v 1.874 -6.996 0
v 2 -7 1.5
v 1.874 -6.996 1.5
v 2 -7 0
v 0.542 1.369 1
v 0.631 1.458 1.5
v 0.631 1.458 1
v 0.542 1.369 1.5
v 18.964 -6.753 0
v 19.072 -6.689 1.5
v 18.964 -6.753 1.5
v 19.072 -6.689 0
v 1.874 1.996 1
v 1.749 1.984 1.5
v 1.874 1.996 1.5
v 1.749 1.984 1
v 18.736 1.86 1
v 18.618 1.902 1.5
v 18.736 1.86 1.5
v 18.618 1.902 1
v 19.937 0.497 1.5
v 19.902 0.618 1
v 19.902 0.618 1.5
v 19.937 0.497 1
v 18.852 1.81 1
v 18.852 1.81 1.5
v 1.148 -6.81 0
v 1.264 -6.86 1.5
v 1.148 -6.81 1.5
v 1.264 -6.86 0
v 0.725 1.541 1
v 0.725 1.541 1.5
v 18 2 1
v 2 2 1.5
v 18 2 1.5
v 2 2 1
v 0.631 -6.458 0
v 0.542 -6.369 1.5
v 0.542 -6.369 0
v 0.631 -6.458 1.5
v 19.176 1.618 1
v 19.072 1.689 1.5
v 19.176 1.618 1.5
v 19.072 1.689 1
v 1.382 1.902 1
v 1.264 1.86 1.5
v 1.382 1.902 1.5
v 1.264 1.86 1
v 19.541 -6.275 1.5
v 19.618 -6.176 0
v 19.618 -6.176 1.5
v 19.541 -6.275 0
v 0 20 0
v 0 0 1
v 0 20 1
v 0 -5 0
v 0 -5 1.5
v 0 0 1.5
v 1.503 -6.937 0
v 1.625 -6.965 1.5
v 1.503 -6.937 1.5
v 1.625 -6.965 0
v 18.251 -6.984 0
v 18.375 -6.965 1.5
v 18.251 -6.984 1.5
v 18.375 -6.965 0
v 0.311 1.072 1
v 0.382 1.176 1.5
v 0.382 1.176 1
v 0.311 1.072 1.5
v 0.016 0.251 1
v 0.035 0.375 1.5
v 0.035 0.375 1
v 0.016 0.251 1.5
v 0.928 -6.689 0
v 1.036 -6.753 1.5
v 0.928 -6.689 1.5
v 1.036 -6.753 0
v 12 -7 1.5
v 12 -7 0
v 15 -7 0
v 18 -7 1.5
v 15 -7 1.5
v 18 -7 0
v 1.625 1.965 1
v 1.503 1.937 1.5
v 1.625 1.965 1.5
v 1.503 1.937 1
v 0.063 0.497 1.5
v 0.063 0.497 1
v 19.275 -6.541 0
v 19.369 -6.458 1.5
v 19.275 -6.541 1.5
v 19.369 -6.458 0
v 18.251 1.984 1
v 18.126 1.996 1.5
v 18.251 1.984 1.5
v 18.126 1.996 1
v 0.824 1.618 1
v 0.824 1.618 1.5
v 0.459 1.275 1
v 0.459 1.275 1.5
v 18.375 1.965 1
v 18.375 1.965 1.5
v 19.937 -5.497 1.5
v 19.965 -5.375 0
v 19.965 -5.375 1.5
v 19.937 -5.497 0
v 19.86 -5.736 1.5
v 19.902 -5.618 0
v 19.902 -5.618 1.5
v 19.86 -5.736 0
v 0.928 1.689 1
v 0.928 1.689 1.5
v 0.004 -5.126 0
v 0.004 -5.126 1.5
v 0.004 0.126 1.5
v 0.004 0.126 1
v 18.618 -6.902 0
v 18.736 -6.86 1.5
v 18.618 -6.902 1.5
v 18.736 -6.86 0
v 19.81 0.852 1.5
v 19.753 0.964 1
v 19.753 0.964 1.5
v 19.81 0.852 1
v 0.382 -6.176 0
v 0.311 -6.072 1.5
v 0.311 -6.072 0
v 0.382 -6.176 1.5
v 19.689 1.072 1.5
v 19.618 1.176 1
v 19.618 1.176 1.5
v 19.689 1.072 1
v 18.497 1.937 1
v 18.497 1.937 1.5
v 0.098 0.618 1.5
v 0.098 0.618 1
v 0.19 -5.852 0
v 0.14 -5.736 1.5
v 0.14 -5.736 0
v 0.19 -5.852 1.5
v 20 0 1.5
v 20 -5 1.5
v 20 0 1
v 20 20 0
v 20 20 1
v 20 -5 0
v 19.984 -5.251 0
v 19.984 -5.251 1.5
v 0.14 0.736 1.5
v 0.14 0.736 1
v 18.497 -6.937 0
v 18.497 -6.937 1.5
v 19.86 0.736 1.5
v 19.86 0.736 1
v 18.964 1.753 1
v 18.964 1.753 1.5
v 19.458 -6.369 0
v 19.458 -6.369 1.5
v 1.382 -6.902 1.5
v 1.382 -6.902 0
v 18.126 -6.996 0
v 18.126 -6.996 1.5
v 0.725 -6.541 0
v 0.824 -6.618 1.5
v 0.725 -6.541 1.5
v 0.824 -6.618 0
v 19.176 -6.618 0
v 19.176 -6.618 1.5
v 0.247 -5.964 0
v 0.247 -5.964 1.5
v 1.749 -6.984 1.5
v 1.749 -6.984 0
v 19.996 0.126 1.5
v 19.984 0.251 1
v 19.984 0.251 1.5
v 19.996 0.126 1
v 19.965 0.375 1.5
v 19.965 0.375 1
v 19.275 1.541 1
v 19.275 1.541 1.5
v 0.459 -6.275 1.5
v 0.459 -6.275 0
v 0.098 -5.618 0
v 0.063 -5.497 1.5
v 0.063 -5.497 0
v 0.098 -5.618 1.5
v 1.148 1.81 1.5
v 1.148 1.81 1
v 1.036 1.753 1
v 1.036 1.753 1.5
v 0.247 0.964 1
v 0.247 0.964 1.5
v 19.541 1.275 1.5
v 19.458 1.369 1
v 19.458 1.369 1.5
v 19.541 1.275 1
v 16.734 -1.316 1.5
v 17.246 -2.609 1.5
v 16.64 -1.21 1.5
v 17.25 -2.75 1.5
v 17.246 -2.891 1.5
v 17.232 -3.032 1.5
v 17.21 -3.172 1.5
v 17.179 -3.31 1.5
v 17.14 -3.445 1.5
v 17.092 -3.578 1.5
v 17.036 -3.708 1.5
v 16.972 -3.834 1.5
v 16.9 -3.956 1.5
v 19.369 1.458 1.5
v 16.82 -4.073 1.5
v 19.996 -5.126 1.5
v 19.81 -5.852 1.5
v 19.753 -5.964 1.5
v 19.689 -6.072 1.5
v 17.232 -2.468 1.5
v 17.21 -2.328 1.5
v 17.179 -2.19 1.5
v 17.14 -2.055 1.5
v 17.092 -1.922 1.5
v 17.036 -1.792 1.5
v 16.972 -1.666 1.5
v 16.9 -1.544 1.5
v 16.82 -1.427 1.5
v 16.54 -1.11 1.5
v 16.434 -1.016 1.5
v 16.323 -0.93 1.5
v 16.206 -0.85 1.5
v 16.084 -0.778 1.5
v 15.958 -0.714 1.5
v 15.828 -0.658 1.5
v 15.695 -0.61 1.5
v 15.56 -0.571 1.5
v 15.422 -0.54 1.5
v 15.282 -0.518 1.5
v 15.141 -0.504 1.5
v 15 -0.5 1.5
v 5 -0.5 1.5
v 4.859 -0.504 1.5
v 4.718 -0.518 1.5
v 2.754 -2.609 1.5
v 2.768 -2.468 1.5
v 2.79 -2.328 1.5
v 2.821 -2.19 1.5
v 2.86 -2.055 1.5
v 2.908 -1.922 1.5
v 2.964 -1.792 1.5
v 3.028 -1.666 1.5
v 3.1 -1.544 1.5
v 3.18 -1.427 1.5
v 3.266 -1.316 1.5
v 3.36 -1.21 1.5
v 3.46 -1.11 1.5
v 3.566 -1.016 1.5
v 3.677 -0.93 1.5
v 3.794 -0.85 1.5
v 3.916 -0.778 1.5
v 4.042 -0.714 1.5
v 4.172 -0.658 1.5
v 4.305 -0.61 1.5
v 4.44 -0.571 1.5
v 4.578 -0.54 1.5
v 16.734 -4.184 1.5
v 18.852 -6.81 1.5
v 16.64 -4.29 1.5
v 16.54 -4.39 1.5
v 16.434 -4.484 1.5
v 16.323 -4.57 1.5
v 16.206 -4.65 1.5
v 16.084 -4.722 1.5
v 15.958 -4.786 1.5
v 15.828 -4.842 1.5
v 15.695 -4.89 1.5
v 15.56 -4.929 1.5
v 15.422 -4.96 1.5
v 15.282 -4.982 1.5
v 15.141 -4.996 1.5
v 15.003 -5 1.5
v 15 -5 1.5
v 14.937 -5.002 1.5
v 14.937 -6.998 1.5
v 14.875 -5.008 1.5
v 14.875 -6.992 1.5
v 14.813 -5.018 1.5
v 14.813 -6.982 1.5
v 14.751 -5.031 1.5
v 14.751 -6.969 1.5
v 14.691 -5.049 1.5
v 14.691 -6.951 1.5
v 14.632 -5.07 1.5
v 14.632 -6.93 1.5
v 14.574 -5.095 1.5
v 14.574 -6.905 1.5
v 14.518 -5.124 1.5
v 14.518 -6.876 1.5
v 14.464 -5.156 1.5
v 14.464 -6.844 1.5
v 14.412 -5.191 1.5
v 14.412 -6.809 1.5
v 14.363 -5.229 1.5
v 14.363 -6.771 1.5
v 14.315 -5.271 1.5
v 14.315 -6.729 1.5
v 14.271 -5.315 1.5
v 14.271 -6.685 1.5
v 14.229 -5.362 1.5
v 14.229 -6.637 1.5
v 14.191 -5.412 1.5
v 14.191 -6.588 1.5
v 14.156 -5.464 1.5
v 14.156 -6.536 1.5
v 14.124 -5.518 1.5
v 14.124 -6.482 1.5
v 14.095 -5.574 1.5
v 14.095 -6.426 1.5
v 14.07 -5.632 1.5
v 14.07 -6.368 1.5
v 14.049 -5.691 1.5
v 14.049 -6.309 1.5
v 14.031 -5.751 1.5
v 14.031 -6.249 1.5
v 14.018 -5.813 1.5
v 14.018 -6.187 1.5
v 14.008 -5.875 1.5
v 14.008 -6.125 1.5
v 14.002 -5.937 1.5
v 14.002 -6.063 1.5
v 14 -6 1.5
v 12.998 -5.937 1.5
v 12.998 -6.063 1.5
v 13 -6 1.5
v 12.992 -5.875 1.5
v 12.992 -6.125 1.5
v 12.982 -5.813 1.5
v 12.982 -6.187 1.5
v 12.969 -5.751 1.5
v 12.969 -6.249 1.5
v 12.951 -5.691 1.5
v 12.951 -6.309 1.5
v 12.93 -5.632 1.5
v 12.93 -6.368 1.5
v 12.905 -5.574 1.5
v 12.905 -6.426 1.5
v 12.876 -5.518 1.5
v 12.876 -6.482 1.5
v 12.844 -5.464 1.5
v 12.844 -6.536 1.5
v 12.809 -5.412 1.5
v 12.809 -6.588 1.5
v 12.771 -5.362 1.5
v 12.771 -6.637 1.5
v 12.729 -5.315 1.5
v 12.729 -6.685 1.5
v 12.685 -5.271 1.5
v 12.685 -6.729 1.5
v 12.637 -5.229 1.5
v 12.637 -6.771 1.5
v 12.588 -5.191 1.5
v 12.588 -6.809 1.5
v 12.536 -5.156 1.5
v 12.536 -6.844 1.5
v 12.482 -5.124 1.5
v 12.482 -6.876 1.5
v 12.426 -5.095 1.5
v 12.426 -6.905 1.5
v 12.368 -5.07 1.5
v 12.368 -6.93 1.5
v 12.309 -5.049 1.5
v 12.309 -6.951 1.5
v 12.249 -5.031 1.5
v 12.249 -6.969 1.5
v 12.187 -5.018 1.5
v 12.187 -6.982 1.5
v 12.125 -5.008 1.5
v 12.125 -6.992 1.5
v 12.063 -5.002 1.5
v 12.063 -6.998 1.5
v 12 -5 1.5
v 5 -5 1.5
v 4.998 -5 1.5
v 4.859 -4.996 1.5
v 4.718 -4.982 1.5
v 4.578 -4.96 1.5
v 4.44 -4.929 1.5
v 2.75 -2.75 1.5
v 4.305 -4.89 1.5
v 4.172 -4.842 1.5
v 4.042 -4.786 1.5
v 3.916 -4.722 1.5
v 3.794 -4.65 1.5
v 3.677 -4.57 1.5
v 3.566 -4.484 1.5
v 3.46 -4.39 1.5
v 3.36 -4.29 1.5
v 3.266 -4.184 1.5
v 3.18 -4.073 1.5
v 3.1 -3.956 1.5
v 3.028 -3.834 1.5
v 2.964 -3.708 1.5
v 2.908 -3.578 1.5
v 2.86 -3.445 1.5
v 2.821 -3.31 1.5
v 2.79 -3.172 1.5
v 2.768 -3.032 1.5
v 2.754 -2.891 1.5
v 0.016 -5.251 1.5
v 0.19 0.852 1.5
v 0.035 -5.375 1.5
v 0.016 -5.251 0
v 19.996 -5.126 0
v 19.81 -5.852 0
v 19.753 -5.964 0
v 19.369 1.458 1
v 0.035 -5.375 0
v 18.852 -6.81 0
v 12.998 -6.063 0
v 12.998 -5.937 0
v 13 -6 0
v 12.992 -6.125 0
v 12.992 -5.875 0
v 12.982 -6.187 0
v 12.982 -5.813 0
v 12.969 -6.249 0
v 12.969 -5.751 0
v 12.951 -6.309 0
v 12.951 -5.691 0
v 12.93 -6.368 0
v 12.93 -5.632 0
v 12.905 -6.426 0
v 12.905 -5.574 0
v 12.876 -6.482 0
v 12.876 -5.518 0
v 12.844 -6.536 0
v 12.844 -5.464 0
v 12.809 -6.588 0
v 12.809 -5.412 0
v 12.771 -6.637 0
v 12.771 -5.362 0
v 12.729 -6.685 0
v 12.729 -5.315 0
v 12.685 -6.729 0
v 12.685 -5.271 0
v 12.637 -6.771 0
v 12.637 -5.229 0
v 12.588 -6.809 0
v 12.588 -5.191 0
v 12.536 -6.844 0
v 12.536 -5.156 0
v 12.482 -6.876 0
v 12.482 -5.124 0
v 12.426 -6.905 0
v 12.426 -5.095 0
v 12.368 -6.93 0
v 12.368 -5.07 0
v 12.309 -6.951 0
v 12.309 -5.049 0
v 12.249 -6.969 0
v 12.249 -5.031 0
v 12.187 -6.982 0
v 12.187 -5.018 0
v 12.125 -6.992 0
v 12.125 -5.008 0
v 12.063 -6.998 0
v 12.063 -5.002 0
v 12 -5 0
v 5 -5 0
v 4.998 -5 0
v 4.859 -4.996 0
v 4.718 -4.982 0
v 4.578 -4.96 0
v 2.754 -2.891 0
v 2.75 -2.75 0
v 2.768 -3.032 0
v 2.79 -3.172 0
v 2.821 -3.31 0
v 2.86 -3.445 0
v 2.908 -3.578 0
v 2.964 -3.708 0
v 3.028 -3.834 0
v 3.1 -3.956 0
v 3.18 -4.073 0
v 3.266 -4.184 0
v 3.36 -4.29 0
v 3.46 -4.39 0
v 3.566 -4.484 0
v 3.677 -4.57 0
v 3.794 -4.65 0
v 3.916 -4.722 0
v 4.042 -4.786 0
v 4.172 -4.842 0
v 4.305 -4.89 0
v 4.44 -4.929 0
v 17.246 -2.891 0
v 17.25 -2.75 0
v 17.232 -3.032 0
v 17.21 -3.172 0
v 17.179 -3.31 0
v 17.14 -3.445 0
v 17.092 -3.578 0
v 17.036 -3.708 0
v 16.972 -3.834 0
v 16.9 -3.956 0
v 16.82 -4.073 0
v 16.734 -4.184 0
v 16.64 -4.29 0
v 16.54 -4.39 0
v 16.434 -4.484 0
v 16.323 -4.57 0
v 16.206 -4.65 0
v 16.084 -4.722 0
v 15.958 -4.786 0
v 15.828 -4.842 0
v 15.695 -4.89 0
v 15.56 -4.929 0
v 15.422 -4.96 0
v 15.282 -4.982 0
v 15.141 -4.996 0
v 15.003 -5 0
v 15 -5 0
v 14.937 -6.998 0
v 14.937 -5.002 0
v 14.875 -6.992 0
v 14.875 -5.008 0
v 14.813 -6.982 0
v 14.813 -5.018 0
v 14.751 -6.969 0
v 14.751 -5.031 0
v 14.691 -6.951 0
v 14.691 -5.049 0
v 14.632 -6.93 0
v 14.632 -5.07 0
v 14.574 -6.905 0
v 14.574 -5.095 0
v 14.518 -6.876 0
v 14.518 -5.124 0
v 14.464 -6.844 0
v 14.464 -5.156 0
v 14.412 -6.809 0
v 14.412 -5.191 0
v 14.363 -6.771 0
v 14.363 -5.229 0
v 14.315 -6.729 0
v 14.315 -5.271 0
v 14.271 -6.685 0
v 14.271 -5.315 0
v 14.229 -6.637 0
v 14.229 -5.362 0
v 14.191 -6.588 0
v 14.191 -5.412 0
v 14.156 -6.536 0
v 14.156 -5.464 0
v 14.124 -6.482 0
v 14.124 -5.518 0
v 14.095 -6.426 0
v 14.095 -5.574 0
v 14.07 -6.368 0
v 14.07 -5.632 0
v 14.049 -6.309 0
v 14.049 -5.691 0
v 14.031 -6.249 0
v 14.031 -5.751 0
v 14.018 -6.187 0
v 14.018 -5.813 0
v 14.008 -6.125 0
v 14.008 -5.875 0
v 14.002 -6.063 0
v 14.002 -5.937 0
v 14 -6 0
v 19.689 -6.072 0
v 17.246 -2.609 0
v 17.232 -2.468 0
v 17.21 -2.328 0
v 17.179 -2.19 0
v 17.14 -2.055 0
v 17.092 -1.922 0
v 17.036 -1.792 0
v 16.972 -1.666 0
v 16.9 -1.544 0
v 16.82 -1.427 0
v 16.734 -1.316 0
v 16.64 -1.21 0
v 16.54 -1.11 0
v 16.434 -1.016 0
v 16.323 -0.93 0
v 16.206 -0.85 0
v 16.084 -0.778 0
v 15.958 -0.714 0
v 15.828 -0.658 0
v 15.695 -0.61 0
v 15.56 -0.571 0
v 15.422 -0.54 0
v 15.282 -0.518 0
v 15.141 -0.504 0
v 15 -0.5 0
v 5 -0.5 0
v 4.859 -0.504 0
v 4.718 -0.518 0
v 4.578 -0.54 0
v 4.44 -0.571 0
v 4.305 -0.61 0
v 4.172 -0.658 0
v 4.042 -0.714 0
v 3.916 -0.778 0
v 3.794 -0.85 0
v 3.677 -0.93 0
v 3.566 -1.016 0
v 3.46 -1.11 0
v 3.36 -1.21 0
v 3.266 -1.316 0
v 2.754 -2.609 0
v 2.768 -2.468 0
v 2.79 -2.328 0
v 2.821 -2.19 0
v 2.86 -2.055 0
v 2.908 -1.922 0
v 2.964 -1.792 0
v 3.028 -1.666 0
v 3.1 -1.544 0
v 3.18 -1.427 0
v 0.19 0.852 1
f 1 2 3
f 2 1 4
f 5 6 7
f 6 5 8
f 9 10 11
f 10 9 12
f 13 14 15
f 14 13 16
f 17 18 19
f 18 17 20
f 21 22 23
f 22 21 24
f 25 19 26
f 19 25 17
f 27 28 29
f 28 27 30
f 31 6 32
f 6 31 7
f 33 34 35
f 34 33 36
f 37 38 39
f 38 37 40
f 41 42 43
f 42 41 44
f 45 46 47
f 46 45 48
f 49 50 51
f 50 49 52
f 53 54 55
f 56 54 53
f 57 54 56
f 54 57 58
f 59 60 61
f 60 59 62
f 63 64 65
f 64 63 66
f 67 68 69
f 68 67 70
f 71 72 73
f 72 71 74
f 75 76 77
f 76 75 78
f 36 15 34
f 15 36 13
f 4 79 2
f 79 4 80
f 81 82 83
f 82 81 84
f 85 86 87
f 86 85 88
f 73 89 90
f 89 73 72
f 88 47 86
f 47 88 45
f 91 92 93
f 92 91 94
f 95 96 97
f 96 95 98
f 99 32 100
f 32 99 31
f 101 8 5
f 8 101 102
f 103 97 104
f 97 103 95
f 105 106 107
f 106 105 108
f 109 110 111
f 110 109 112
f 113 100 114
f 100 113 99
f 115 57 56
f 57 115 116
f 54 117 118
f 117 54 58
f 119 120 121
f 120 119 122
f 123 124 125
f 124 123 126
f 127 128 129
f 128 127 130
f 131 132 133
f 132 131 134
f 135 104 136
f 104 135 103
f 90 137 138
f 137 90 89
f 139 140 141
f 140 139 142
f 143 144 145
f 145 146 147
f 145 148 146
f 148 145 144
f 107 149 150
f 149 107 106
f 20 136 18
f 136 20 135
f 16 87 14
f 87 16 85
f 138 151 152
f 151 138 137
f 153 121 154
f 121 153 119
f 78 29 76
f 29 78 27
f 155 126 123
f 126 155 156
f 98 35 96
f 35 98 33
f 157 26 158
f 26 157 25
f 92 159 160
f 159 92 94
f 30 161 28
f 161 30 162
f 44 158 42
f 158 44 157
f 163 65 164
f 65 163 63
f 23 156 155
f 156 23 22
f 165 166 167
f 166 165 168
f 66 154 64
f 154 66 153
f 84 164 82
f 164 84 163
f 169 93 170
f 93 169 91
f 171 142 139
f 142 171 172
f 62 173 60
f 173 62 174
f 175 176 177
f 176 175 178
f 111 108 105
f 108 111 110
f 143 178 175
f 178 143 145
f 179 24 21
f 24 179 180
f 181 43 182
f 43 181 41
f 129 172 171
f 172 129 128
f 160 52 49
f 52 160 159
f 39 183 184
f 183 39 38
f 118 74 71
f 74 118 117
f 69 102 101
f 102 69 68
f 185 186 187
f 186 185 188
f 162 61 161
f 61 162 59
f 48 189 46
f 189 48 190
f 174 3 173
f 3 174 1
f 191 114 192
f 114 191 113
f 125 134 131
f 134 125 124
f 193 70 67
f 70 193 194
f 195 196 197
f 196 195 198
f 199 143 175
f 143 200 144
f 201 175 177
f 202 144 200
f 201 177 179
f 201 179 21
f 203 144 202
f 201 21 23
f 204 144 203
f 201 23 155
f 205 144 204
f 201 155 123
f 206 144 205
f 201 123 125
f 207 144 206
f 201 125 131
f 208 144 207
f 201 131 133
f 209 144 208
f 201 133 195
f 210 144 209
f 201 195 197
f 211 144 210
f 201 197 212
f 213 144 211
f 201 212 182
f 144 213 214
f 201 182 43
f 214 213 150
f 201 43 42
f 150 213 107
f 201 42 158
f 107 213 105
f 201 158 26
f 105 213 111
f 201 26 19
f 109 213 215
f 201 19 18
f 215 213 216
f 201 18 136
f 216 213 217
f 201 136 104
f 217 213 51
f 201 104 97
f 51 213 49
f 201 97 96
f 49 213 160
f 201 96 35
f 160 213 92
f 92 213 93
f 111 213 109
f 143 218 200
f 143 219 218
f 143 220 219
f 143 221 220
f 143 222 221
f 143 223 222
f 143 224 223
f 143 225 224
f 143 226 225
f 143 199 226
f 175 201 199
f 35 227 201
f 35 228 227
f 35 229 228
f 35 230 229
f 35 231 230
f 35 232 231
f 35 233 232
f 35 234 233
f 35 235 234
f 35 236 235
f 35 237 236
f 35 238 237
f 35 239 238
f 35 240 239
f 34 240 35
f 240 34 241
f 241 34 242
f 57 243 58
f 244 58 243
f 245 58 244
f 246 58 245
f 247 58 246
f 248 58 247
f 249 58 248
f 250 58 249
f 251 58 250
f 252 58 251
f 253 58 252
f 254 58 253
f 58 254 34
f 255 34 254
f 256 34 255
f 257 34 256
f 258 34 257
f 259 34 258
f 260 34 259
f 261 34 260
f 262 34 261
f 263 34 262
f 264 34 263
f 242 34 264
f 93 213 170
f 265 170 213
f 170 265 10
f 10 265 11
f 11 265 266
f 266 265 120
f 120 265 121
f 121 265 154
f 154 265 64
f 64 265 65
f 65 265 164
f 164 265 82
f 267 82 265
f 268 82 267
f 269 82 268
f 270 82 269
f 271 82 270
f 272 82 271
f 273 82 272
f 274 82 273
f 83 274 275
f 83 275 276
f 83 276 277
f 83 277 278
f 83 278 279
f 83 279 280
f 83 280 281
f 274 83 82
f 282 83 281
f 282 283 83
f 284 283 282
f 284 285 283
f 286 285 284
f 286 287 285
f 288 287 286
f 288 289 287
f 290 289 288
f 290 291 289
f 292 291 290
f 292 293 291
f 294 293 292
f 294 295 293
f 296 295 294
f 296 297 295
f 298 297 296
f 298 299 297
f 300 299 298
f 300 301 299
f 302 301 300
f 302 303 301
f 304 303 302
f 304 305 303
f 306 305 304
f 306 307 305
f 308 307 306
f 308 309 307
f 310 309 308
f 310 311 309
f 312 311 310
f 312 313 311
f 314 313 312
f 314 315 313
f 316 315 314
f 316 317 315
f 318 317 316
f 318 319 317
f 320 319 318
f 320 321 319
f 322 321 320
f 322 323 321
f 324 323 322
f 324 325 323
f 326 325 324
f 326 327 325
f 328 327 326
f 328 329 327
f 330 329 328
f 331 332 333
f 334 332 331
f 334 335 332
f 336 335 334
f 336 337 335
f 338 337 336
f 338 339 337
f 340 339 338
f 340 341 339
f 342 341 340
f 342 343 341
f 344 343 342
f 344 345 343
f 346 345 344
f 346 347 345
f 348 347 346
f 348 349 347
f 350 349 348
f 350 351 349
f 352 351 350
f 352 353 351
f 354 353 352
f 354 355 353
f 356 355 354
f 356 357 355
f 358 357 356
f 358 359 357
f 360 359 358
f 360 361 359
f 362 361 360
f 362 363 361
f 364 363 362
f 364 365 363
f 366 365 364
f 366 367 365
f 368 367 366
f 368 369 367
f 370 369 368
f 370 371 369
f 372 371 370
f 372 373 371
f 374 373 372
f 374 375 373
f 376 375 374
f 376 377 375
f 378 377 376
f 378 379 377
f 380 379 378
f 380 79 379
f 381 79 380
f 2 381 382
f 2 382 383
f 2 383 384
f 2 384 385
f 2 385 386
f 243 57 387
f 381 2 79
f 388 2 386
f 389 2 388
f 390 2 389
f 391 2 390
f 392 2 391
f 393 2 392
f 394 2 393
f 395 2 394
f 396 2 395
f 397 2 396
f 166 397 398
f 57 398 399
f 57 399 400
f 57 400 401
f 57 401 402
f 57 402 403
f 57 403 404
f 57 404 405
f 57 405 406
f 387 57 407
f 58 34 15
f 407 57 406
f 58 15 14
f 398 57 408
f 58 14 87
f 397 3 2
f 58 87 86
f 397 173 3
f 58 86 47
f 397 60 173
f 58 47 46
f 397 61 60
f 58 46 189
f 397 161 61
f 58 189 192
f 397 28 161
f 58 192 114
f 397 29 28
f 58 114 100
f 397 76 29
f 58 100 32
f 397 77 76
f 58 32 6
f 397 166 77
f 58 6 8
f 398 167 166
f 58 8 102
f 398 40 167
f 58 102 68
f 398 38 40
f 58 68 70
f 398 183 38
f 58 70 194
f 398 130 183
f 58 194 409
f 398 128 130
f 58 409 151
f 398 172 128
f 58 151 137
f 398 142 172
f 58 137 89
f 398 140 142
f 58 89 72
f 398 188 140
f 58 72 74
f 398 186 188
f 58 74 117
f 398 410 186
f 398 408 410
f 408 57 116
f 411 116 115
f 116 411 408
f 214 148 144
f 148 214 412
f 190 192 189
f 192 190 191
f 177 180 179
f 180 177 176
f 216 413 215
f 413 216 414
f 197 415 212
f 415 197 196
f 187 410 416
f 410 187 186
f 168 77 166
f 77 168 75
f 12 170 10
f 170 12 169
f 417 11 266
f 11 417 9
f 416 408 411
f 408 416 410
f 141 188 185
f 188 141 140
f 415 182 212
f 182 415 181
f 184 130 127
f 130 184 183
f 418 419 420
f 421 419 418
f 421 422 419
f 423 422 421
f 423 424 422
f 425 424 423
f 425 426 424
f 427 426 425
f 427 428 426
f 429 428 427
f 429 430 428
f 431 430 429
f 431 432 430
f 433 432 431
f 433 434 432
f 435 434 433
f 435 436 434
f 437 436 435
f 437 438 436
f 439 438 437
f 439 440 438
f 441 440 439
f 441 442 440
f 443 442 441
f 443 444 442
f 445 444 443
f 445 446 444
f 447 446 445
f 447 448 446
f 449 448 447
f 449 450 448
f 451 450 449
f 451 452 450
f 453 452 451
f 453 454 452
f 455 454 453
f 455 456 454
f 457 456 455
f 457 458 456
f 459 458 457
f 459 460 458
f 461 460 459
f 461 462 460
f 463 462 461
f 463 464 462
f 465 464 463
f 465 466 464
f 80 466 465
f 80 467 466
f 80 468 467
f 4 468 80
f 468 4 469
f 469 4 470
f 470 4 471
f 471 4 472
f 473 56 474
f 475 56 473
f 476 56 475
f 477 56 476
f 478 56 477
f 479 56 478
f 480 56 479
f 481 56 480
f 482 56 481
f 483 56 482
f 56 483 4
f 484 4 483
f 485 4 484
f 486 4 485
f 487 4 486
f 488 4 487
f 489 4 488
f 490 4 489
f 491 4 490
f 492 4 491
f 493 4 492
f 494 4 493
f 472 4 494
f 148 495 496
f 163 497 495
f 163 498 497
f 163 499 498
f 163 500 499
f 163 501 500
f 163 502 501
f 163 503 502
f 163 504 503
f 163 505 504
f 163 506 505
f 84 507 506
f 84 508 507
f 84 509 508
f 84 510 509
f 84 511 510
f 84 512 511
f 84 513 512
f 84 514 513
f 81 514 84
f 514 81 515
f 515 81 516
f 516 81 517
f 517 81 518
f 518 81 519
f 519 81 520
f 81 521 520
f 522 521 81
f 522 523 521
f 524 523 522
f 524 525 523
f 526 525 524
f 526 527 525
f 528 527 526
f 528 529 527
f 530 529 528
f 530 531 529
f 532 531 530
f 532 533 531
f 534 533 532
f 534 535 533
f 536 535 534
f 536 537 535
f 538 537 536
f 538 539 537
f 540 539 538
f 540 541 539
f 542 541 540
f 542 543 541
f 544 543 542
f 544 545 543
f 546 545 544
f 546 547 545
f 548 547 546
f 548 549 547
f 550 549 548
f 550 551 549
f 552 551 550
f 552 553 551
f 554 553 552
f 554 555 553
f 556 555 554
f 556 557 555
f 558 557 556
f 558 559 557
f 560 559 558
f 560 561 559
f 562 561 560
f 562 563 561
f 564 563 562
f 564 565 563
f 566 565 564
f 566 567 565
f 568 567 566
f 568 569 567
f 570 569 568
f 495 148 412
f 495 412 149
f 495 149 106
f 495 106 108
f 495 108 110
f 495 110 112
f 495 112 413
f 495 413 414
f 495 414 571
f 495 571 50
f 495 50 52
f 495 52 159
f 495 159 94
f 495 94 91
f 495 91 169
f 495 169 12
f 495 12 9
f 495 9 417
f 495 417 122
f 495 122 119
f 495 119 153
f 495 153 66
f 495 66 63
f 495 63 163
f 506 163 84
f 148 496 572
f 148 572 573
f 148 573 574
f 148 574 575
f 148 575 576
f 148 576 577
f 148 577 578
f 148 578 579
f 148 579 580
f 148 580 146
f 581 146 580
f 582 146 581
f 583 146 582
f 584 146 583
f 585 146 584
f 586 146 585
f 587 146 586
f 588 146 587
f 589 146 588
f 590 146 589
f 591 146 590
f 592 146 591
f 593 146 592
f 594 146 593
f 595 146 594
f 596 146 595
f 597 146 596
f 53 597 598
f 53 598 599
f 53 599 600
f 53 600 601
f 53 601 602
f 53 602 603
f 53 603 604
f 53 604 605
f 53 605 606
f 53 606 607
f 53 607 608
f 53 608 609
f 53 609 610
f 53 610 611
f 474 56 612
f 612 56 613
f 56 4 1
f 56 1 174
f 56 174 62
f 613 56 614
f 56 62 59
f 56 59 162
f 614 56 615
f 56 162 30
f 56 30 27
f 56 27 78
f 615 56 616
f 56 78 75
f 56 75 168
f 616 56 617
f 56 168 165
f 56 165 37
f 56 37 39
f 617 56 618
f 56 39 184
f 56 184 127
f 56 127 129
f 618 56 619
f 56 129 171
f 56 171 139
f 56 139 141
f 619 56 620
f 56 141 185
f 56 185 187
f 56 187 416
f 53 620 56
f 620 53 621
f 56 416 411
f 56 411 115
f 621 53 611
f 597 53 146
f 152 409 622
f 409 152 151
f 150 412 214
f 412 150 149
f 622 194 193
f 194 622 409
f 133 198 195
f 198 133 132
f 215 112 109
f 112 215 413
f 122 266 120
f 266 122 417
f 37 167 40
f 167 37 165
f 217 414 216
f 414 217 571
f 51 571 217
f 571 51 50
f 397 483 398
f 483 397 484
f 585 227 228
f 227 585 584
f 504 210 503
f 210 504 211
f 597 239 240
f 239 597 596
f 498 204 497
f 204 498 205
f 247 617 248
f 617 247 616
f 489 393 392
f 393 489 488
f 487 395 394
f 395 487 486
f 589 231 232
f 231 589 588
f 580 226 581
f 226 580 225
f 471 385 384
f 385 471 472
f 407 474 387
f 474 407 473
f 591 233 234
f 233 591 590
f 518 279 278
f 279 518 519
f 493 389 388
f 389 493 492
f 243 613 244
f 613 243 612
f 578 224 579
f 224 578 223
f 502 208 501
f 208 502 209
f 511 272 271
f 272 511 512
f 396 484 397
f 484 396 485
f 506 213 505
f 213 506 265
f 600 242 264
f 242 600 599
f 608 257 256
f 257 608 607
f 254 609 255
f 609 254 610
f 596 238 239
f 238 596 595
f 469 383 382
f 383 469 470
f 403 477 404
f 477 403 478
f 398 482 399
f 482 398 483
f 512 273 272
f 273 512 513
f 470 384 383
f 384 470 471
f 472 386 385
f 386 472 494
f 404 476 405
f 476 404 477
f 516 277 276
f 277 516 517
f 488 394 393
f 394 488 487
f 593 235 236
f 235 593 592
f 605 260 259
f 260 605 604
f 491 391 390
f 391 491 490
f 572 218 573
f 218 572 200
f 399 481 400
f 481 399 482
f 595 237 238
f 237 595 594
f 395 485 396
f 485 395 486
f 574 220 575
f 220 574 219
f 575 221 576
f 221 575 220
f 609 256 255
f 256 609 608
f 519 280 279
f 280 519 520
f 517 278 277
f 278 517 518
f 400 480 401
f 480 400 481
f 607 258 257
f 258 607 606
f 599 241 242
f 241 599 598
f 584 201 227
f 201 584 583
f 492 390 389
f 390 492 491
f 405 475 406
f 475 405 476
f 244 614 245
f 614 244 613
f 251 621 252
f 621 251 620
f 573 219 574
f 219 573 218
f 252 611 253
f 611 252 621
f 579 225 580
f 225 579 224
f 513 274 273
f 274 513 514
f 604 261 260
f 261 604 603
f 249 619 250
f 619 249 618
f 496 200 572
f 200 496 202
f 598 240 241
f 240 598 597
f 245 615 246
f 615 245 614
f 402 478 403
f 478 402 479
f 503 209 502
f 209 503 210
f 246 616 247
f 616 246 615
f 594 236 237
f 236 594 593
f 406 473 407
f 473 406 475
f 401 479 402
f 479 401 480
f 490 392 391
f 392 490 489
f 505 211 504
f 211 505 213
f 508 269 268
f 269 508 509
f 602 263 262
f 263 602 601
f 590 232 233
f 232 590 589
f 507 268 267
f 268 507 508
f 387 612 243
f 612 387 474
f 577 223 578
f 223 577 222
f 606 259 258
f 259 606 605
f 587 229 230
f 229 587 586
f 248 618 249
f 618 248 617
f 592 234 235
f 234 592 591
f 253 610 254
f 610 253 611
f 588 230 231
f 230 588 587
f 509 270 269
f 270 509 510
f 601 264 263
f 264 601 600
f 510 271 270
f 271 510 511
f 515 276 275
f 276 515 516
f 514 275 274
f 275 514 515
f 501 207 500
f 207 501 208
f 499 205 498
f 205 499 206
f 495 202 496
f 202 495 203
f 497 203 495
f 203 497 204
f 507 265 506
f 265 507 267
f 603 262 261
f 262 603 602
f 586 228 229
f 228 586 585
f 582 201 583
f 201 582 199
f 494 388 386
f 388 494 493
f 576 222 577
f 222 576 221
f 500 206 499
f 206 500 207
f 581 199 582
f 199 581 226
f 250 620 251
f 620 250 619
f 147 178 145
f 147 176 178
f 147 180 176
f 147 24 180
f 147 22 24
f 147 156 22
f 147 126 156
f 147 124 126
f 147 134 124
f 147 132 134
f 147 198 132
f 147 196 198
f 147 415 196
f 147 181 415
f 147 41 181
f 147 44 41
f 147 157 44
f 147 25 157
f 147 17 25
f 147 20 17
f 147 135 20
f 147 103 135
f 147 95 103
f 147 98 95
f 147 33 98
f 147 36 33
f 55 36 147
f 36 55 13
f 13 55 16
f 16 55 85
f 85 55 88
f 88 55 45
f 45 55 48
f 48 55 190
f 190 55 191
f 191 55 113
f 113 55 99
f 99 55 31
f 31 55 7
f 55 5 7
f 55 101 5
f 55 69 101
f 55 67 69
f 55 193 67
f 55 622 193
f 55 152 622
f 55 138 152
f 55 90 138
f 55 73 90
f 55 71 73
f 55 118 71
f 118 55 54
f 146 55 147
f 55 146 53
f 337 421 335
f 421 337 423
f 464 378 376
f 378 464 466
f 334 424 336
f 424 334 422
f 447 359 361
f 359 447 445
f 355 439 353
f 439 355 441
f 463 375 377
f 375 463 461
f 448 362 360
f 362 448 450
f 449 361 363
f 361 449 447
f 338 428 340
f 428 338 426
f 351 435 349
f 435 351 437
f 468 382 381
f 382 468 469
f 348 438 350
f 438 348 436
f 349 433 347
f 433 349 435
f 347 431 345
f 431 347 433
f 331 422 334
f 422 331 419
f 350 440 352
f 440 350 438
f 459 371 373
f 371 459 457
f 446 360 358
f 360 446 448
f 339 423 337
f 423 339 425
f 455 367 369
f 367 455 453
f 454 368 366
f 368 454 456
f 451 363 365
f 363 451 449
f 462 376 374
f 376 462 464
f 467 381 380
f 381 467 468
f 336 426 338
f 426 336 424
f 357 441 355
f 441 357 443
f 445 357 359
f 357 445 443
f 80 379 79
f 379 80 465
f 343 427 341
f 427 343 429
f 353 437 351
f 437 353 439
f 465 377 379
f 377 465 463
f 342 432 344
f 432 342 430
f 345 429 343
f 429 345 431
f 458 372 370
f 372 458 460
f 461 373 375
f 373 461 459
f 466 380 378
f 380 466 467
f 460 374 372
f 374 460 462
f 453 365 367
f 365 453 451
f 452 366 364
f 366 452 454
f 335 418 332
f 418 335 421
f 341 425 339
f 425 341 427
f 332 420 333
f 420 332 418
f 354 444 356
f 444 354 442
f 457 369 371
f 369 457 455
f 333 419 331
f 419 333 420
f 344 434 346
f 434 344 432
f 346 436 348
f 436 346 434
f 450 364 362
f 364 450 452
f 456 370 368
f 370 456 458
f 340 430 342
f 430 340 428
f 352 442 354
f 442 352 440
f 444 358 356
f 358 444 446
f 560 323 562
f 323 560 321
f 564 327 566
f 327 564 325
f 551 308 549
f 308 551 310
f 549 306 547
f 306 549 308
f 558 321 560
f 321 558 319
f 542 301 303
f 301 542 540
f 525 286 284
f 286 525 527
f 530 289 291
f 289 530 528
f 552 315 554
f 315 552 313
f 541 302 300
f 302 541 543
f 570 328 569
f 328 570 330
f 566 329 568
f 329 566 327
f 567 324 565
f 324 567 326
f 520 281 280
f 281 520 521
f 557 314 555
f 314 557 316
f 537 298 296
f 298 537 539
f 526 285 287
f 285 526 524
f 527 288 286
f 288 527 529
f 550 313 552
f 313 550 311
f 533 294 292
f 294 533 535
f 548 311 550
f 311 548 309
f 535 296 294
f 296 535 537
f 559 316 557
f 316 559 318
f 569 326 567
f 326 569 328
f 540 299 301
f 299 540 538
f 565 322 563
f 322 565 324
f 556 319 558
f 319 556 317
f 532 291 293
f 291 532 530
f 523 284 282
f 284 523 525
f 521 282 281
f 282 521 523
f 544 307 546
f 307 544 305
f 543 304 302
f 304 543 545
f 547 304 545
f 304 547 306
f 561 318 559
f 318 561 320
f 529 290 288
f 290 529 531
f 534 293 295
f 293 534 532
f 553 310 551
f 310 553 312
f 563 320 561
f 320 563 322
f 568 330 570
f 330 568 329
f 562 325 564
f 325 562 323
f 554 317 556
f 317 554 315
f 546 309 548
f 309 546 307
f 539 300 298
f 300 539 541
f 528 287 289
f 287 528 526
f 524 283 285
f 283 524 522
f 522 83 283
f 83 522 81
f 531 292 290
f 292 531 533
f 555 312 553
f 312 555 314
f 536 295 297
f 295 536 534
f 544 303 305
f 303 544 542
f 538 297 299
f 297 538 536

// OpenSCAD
$fn = 100;

union() {
  
  cube([20, 20, 1]);

  difference() {
    translate([2, -5, 0])
    minkowski() {
      cube([16, 5, 1]);
      
      cylinder(h=0.5, r = 2);
    }
    
    translate([5, -2.75, -1])
      minkowski() {
        cube([10, 0.0001, 4]);
        
        cylinder(h=0.5, r = 2.25);
      }
      
    translate([5, -9, -1])
      cube([10, 5, 10]);
  }


  translate([5, -6, 0])
    minkowski() {
      cube([7, 0.0001, 1]);
      
      cylinder(h=0.5, r = 1);
    }

  translate([15, -6, 0])
    minkowski() {
      cube([2, 0.0001, 1]);
      
      cylinder(h=0.5, r = 1);
    }


}
